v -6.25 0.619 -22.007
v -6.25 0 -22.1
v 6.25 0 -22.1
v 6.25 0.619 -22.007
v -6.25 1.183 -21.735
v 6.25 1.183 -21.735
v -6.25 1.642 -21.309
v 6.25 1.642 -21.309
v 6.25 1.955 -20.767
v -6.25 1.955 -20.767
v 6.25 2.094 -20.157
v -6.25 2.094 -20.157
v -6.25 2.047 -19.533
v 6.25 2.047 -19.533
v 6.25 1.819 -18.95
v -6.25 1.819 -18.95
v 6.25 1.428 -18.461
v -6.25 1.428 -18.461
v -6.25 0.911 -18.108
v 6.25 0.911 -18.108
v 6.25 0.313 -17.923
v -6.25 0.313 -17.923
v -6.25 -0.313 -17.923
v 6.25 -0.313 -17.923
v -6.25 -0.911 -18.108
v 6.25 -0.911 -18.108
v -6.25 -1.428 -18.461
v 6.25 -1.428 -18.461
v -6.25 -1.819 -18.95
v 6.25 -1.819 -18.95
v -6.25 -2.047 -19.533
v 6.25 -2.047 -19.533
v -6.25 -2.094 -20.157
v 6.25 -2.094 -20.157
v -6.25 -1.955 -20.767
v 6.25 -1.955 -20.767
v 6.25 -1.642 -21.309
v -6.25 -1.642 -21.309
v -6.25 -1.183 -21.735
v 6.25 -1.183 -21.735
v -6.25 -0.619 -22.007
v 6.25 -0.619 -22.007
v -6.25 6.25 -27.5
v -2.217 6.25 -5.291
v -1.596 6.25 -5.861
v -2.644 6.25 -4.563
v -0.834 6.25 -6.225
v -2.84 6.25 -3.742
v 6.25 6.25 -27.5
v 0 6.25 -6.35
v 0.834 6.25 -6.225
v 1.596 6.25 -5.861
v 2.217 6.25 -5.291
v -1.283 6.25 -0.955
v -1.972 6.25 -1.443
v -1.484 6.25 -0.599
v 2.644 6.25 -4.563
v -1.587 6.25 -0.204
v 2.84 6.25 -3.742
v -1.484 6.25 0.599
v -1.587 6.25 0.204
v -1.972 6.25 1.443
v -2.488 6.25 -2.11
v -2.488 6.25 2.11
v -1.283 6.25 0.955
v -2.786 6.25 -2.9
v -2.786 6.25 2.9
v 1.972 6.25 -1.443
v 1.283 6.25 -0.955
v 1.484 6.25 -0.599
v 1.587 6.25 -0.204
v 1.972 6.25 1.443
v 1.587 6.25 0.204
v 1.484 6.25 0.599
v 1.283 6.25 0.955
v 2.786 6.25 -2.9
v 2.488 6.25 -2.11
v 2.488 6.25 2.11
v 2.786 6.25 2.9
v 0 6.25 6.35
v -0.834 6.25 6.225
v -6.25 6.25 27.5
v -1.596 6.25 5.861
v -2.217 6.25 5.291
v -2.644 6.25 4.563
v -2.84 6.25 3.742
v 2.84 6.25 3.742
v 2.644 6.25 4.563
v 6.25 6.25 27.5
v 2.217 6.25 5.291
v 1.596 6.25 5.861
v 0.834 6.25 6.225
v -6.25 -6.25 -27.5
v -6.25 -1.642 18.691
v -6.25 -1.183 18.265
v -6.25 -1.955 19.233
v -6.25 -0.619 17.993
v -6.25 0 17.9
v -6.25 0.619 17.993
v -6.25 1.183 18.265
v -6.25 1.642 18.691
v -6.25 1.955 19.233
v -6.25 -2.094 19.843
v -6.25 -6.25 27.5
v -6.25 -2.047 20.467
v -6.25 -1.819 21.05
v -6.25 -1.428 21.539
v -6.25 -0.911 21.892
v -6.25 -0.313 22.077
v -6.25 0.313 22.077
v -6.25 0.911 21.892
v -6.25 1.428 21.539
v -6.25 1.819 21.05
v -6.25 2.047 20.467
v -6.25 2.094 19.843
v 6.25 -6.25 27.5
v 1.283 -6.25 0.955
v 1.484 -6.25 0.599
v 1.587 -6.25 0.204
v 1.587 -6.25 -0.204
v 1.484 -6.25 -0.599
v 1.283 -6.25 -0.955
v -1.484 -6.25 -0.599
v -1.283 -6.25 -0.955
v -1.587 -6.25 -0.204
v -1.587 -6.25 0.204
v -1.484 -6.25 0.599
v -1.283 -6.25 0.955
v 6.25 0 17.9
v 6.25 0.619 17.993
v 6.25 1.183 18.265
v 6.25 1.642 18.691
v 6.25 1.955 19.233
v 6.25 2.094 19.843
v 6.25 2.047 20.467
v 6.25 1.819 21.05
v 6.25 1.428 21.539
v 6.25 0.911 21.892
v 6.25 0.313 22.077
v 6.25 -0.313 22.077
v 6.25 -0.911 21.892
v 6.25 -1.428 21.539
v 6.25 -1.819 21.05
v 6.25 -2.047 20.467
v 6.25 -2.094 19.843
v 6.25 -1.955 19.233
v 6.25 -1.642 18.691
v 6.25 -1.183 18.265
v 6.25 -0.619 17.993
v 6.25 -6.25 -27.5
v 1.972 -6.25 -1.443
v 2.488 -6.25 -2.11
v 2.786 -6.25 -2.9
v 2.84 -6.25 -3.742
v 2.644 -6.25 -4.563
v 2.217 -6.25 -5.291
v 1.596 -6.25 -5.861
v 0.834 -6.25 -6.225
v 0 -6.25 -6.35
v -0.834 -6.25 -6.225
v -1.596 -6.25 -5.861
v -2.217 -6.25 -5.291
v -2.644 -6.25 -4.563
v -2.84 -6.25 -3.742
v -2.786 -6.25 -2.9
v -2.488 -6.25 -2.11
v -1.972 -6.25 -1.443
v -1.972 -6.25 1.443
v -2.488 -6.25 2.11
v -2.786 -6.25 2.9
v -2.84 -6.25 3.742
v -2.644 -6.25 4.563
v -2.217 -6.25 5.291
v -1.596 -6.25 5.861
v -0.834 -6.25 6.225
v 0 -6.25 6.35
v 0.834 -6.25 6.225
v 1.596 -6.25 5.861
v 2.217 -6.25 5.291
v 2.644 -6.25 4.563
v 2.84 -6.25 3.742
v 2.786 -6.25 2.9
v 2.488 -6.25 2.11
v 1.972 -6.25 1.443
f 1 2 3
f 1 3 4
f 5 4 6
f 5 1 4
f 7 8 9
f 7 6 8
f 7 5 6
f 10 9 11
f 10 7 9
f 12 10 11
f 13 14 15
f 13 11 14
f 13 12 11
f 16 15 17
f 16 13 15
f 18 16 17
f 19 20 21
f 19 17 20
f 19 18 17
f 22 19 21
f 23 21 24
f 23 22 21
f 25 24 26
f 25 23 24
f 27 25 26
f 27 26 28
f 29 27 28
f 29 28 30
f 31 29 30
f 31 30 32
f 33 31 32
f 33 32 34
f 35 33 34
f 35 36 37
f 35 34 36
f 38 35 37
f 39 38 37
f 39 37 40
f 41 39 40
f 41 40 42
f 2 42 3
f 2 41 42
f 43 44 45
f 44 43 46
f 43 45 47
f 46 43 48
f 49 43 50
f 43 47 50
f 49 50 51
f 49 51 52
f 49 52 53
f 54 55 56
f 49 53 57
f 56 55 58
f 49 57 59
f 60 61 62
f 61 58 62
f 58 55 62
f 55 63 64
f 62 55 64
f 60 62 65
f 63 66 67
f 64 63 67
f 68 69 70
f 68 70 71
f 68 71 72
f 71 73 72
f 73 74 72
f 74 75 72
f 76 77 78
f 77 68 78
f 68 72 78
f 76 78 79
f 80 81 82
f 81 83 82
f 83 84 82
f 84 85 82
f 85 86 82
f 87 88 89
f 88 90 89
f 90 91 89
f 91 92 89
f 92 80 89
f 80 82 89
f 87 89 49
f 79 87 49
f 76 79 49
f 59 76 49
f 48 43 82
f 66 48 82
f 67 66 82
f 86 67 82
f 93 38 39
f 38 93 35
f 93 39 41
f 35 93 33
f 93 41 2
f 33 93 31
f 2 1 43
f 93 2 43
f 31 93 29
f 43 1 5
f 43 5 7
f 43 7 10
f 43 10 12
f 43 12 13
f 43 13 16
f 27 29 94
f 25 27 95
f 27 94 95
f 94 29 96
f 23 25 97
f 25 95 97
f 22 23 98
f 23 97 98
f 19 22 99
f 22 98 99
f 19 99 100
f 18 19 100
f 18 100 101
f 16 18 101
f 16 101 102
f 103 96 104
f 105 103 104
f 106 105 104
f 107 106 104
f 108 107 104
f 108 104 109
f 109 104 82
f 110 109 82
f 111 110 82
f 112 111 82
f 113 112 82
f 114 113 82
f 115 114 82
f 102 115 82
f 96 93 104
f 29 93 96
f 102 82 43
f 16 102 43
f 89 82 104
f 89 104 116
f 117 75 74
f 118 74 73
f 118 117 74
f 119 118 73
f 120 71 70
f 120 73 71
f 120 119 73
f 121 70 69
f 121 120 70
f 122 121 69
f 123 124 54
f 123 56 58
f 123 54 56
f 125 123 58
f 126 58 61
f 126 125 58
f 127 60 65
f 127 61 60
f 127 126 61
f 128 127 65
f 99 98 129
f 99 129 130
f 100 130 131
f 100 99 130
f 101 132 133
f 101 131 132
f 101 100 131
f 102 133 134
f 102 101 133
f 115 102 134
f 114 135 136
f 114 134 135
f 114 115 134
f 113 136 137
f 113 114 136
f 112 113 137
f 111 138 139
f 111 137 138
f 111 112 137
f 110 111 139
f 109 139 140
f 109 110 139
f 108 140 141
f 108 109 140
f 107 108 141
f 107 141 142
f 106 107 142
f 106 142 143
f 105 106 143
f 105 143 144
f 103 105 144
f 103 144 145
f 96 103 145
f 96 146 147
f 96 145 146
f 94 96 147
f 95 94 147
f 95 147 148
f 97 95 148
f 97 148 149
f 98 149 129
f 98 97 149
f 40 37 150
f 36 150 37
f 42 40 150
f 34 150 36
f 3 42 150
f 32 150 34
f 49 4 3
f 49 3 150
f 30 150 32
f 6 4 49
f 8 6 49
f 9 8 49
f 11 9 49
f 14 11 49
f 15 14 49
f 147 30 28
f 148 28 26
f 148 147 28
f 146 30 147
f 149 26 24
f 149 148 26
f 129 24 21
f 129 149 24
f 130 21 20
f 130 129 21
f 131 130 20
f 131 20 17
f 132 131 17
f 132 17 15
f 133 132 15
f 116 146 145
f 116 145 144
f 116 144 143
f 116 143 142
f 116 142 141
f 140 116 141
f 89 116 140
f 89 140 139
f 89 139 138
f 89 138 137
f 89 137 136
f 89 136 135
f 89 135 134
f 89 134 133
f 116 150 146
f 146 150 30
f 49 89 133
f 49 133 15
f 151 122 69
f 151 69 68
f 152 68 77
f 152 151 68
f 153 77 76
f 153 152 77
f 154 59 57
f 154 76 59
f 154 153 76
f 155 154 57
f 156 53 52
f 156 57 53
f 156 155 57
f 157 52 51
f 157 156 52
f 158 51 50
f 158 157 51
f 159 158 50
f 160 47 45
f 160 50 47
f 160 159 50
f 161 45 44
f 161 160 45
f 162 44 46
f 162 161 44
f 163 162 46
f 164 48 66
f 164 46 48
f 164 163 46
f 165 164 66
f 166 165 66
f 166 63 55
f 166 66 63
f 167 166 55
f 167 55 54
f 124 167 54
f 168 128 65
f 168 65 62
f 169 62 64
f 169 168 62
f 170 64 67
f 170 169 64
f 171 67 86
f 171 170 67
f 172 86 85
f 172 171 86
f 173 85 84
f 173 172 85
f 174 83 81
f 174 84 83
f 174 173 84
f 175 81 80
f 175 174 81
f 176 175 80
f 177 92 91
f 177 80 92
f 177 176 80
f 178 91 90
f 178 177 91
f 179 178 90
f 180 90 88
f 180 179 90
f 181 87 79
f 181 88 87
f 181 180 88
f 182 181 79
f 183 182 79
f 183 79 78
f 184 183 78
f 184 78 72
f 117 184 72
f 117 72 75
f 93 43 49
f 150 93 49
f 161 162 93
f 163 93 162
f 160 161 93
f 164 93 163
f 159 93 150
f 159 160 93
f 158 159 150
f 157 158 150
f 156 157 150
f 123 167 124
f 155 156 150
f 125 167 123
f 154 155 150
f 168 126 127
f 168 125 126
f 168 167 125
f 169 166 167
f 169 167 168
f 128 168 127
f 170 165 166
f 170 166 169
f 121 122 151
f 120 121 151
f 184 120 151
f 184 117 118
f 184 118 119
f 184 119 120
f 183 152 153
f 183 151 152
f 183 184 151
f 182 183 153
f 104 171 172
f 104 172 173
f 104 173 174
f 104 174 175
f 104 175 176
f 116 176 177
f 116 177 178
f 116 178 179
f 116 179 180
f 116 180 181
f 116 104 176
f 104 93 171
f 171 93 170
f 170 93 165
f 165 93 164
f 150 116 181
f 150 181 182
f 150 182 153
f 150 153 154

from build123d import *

# Parameters (mm, degrees)
ESQUISSE1_W                  = 12.5
ESQUISSE1_H                  = 12.5
BOSS_EXTRU_1_DEPTH           = 27.5
ENL_V_MAT_EXTRU_1_DEPTH      = 29.885550021
ENL_V_MAT_EXTRU_1_DEPTH_BACK = 29.885550021
ESQUISSE2_R                  = 2.85
ENL_V_MAT_EXTRU_2_DEPTH      = 29.885550021
ENL_V_MAT_EXTRU_2_DEPTH_BACK = 29.885550021
ESQUISSE3_R                  = 1.6
ENL_V_MAT_EXTRU_3_DEPTH      = 29.885550021
ENL_V_MAT_EXTRU_3_DEPTH_BACK = 29.885550021
ESQUISSE4_R                  = 2.1


with BuildPart() as part:
    # Esquisse1 → Boss.-Extru.1 (new, symmetric)
    with BuildSketch(Plane.XY):
        Rectangle(ESQUISSE1_W, ESQUISSE1_H)
    extrude(amount=BOSS_EXTRU_1_DEPTH, both=True)

    # Esquisse2 → Enlèv. mat.-Extru.1 (cut, two sides: drawn at the far end of the back side and taken through both)
    with BuildSketch(Plane(origin=(0, 0, 0), x_dir=(1, 0, 0), z_dir=(0, 1, 0)).offset(-ENL_V_MAT_EXTRU_1_DEPTH_BACK)):
        with Locations(Location((0, 3.5, 0), (0, 0, 270))):
            Circle(ESQUISSE2_R)
        with Locations(Location((0, -3.5, 0), (0, 0, 270))):
            Circle(ESQUISSE2_R)
    extrude(amount=ENL_V_MAT_EXTRU_1_DEPTH + ENL_V_MAT_EXTRU_1_DEPTH_BACK, mode=Mode.SUBTRACT)

    # Esquisse3 → Enlèv. mat.-Extru.2 (cut, two sides: drawn at the far end of the back side and taken through both)
    with BuildSketch(Plane(origin=(0, 0, 0), x_dir=(1, 0, 0), z_dir=(0, 1, 0)).offset(-ENL_V_MAT_EXTRU_2_DEPTH_BACK)):
        Circle(ESQUISSE3_R)
    extrude(amount=ENL_V_MAT_EXTRU_2_DEPTH + ENL_V_MAT_EXTRU_2_DEPTH_BACK, mode=Mode.SUBTRACT)

    # Esquisse4 → Enlèv. mat.-Extru.3 (cut, two sides: drawn at the far end of the back side and taken through both)
    with BuildSketch(Plane(origin=(0, 0, 0), x_dir=(0, 0, -1), z_dir=(1, 0, 0)).offset(-ENL_V_MAT_EXTRU_3_DEPTH_BACK)):
        with Locations((-20, 0)):
            Circle(ESQUISSE4_R)
        with Locations((20, 0)):
            Circle(ESQUISSE4_R)
    extrude(amount=ENL_V_MAT_EXTRU_3_DEPTH + ENL_V_MAT_EXTRU_3_DEPTH_BACK, mode=Mode.SUBTRACT)


solid = part.part
